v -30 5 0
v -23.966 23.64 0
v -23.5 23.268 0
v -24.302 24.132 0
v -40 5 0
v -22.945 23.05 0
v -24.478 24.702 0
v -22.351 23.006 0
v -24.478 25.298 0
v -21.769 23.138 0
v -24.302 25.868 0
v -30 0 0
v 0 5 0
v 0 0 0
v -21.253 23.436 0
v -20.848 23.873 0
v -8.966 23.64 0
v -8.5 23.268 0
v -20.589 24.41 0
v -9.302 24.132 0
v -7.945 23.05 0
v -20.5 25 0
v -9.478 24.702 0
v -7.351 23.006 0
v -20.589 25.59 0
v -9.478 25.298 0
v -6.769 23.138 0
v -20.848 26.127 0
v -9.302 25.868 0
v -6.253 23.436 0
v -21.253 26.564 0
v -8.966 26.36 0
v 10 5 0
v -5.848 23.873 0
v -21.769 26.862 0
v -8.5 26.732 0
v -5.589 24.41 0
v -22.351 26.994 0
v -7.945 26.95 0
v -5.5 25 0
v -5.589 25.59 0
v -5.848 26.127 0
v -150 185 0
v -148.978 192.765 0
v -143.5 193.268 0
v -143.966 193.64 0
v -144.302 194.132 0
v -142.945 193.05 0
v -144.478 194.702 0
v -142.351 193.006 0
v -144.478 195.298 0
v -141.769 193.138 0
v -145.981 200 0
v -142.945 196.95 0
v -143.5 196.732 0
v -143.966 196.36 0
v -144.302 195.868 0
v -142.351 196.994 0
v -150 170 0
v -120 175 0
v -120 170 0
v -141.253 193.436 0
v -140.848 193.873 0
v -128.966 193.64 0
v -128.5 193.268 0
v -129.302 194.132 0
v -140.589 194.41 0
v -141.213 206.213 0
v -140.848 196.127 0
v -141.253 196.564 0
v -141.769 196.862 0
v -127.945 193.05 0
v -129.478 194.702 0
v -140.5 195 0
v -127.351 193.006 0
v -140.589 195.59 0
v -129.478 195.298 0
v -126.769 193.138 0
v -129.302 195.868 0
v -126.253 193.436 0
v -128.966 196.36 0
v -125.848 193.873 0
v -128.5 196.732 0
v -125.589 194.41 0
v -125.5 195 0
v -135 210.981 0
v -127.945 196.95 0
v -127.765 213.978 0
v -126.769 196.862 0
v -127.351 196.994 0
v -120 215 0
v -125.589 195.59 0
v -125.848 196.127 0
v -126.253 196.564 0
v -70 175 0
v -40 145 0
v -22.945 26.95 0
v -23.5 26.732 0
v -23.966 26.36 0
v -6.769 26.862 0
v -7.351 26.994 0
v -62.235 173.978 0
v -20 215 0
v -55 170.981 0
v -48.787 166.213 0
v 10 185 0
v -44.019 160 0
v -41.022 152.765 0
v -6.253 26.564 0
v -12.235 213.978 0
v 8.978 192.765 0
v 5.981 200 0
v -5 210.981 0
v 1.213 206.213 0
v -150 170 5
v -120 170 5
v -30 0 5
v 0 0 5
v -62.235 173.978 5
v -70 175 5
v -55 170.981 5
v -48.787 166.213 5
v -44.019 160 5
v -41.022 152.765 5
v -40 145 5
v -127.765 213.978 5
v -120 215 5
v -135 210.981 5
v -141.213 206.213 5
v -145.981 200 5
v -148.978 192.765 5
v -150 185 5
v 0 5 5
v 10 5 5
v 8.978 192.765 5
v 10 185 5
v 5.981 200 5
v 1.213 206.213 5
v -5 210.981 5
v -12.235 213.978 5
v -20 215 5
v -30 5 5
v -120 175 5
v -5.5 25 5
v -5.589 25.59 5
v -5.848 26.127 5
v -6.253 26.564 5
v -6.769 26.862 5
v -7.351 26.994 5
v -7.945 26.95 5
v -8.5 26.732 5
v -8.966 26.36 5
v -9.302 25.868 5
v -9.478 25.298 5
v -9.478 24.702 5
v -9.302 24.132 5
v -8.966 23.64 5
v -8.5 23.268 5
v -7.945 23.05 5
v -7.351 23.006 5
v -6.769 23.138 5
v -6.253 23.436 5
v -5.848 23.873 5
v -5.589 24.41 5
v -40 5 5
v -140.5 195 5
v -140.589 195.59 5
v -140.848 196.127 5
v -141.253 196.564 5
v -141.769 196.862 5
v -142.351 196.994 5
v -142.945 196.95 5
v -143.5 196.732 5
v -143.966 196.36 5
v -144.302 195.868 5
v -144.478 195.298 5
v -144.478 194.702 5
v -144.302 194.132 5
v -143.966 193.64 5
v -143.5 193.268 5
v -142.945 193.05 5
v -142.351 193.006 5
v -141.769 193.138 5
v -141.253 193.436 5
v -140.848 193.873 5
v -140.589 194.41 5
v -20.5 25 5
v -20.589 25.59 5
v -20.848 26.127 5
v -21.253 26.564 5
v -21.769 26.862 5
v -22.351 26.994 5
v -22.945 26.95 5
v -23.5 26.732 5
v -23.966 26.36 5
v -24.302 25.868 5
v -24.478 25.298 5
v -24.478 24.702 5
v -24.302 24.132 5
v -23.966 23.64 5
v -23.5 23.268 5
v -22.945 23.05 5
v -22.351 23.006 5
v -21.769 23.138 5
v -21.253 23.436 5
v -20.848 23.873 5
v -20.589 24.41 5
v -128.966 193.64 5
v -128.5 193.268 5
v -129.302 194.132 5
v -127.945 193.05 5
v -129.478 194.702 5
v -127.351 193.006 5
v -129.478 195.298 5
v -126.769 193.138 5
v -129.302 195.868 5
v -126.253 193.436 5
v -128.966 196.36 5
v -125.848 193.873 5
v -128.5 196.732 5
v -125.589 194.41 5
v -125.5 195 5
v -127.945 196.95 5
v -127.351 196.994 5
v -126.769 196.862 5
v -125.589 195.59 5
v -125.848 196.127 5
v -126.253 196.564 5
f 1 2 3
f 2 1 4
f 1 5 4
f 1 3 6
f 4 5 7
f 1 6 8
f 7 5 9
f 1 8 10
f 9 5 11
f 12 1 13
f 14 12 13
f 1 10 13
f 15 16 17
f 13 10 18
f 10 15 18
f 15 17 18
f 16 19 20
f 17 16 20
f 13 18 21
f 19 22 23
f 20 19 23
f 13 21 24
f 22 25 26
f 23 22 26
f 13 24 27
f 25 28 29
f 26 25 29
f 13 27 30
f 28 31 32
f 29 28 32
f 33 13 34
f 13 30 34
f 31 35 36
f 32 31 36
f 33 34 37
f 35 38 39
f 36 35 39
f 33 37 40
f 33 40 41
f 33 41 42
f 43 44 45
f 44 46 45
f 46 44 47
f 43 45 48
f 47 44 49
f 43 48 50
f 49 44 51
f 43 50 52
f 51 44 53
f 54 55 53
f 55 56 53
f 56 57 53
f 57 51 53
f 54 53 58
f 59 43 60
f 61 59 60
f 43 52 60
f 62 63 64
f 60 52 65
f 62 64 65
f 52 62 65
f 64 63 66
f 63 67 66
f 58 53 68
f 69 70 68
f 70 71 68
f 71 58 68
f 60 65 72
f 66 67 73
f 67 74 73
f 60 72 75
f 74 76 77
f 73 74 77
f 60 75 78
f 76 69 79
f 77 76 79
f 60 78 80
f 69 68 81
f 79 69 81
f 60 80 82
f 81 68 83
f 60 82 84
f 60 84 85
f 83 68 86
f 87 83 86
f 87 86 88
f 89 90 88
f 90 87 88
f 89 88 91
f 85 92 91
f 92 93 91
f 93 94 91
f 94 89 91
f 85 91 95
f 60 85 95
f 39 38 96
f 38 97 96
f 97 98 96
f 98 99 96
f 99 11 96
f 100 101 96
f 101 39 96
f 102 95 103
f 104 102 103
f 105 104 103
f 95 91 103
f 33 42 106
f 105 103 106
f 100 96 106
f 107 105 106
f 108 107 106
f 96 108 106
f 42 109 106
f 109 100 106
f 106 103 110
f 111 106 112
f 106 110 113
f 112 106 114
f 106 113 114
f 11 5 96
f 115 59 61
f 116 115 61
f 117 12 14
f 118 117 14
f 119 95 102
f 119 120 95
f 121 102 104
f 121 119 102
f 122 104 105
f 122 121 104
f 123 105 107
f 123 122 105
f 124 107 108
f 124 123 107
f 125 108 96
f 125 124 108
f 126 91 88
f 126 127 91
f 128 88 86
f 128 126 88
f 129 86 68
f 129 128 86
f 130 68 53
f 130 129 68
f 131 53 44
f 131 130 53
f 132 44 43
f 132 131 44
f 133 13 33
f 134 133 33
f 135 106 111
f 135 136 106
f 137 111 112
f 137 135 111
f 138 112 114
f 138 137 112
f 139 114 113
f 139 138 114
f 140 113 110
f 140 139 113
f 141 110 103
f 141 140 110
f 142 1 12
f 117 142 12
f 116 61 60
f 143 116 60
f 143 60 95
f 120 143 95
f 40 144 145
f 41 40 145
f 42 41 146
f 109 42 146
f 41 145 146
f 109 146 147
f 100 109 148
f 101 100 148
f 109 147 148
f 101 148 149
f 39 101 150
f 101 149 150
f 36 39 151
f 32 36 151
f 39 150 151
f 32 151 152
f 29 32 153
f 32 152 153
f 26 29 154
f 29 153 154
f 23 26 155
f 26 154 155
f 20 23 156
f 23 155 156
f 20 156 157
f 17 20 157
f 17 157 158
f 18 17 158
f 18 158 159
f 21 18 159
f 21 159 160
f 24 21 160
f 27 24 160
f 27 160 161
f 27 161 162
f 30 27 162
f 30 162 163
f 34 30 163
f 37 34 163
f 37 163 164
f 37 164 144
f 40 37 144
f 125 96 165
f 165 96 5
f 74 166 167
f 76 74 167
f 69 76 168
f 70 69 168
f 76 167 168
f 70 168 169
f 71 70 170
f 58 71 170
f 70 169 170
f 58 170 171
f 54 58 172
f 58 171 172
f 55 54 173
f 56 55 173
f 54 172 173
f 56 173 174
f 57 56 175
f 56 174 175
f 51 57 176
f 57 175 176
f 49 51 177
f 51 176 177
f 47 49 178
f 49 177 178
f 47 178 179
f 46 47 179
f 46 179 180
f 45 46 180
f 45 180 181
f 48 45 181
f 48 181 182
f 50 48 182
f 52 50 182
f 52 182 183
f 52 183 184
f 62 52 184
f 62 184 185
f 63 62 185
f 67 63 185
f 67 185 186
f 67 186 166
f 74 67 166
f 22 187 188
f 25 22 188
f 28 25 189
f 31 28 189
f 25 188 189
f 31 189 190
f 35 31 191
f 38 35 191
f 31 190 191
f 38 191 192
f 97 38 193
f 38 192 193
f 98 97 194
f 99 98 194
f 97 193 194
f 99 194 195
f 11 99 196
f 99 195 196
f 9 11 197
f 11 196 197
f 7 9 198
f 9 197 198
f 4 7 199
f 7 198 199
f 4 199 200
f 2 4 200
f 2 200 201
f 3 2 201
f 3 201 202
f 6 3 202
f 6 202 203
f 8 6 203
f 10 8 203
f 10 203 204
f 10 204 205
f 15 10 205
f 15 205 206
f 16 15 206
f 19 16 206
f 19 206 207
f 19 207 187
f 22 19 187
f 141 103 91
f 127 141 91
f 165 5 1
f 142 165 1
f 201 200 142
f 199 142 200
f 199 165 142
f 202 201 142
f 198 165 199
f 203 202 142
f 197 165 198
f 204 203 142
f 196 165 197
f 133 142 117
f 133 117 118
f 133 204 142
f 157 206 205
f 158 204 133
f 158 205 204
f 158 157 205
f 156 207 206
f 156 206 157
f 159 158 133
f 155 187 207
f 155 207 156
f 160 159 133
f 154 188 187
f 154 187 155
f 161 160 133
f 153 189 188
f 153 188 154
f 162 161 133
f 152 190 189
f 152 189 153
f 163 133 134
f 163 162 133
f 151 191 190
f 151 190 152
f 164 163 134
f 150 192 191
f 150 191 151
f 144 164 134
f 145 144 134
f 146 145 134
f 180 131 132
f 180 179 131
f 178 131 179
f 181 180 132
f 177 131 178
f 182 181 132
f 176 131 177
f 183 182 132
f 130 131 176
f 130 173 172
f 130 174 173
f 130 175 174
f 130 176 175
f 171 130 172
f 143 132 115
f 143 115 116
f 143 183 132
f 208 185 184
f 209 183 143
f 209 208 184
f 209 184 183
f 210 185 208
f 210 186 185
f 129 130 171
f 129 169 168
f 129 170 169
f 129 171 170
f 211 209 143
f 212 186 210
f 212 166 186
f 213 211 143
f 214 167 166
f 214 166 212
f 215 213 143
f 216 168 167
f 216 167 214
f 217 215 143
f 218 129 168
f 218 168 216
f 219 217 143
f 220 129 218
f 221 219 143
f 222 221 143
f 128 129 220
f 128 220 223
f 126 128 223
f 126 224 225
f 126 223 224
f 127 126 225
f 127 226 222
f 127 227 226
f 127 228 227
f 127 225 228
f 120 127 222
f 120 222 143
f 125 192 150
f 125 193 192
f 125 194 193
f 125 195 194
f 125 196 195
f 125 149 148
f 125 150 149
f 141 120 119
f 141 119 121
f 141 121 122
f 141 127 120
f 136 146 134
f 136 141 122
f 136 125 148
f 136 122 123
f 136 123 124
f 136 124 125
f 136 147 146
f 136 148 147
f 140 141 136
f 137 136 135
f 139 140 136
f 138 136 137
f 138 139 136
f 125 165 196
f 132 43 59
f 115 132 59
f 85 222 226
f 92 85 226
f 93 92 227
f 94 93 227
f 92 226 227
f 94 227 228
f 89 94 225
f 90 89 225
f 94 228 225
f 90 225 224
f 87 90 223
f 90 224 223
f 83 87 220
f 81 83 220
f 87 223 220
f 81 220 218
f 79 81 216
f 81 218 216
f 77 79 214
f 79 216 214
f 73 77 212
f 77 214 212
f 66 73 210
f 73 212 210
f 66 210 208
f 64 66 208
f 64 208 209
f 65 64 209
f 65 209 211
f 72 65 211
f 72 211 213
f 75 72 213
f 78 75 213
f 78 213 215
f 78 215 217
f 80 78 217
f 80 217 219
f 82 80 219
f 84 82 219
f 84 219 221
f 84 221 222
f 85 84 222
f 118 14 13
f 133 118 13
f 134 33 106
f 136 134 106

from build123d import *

# Parameters (mm, degrees)
SALIENTE_EXTRUIR1_DEPTH = 5
REDONDEO1_R             = 30
CORTAR_EXTRUIR1_REACH   = 264.202
CROQUIS2_R              = 2


with BuildPart() as part:
    # Croquis1 → Saliente-Extruir1 (new body)
    with BuildSketch(Plane.XY):
        Polygon((-30, 0), (0, 0), (0, 5), (10, 5), (10, 215), (-150, 215), (-150, 170), (-120, 170), (-120, 175), (-40, 175), (-40, 5), (-30, 5), align=None)
    extrude(amount=SALIENTE_EXTRUIR1_DEPTH)

    # Redondeo1
    redondeo1_edges = [part.edges().sort_by_distance(p)[0] for p in [
        (-40, 175, 2.5),
        (-150, 215, 2.5),
        (10, 215, 2.5),
    ]]
    fillet(redondeo1_edges, radius=REDONDEO1_R)

    # Croquis2 → Cortar-Extruir1 (cut, up to next)
    with BuildSketch(Plane.XY.offset(5), mode=Mode.PRIVATE) as cortar_extruir1_sk1:
        with Locations((-7.5, 25)):
            Circle(CROQUIS2_R)
    cortar_extruir1_tool1 = extrude(cortar_extruir1_sk1.sketch, amount=-CORTAR_EXTRUIR1_REACH, mode=Mode.PRIVATE) & part.part
    # Croquis2 → Cortar-Extruir1 (cut, up to next)
    with BuildSketch(Plane.XY.offset(5), mode=Mode.PRIVATE) as cortar_extruir1_sk2:
        with Locations((-22.5, 25)):
            Circle(CROQUIS2_R)
    cortar_extruir1_tool2 = extrude(cortar_extruir1_sk2.sketch, amount=-CORTAR_EXTRUIR1_REACH, mode=Mode.PRIVATE) & part.part
    # Croquis2 → Cortar-Extruir1 (cut, up to next)
    with BuildSketch(Plane.XY.offset(5), mode=Mode.PRIVATE) as cortar_extruir1_sk3:
        with Locations((-127.5, 195)):
            Circle(CROQUIS2_R)
    cortar_extruir1_tool3 = extrude(cortar_extruir1_sk3.sketch, amount=-CORTAR_EXTRUIR1_REACH, mode=Mode.PRIVATE) & part.part
    # Croquis2 → Cortar-Extruir1 (cut, up to next)
    with BuildSketch(Plane.XY.offset(5), mode=Mode.PRIVATE) as cortar_extruir1_sk4:
        with Locations((-142.5, 195)):
            Circle(CROQUIS2_R)
    cortar_extruir1_tool4 = extrude(cortar_extruir1_sk4.sketch, amount=-CORTAR_EXTRUIR1_REACH, mode=Mode.PRIVATE) & part.part
    add(cortar_extruir1_tool1.solids().sort_by_distance((-7.5, 25, 5))[0], mode=Mode.SUBTRACT)
    add(cortar_extruir1_tool2.solids().sort_by_distance((-22.5, 25, 5))[0], mode=Mode.SUBTRACT)
    add(cortar_extruir1_tool3.solids().sort_by_distance((-127.5, 195, 5))[0], mode=Mode.SUBTRACT)
    add(cortar_extruir1_tool4.solids().sort_by_distance((-142.5, 195, 5))[0], mode=Mode.SUBTRACT)


solid = part.part
